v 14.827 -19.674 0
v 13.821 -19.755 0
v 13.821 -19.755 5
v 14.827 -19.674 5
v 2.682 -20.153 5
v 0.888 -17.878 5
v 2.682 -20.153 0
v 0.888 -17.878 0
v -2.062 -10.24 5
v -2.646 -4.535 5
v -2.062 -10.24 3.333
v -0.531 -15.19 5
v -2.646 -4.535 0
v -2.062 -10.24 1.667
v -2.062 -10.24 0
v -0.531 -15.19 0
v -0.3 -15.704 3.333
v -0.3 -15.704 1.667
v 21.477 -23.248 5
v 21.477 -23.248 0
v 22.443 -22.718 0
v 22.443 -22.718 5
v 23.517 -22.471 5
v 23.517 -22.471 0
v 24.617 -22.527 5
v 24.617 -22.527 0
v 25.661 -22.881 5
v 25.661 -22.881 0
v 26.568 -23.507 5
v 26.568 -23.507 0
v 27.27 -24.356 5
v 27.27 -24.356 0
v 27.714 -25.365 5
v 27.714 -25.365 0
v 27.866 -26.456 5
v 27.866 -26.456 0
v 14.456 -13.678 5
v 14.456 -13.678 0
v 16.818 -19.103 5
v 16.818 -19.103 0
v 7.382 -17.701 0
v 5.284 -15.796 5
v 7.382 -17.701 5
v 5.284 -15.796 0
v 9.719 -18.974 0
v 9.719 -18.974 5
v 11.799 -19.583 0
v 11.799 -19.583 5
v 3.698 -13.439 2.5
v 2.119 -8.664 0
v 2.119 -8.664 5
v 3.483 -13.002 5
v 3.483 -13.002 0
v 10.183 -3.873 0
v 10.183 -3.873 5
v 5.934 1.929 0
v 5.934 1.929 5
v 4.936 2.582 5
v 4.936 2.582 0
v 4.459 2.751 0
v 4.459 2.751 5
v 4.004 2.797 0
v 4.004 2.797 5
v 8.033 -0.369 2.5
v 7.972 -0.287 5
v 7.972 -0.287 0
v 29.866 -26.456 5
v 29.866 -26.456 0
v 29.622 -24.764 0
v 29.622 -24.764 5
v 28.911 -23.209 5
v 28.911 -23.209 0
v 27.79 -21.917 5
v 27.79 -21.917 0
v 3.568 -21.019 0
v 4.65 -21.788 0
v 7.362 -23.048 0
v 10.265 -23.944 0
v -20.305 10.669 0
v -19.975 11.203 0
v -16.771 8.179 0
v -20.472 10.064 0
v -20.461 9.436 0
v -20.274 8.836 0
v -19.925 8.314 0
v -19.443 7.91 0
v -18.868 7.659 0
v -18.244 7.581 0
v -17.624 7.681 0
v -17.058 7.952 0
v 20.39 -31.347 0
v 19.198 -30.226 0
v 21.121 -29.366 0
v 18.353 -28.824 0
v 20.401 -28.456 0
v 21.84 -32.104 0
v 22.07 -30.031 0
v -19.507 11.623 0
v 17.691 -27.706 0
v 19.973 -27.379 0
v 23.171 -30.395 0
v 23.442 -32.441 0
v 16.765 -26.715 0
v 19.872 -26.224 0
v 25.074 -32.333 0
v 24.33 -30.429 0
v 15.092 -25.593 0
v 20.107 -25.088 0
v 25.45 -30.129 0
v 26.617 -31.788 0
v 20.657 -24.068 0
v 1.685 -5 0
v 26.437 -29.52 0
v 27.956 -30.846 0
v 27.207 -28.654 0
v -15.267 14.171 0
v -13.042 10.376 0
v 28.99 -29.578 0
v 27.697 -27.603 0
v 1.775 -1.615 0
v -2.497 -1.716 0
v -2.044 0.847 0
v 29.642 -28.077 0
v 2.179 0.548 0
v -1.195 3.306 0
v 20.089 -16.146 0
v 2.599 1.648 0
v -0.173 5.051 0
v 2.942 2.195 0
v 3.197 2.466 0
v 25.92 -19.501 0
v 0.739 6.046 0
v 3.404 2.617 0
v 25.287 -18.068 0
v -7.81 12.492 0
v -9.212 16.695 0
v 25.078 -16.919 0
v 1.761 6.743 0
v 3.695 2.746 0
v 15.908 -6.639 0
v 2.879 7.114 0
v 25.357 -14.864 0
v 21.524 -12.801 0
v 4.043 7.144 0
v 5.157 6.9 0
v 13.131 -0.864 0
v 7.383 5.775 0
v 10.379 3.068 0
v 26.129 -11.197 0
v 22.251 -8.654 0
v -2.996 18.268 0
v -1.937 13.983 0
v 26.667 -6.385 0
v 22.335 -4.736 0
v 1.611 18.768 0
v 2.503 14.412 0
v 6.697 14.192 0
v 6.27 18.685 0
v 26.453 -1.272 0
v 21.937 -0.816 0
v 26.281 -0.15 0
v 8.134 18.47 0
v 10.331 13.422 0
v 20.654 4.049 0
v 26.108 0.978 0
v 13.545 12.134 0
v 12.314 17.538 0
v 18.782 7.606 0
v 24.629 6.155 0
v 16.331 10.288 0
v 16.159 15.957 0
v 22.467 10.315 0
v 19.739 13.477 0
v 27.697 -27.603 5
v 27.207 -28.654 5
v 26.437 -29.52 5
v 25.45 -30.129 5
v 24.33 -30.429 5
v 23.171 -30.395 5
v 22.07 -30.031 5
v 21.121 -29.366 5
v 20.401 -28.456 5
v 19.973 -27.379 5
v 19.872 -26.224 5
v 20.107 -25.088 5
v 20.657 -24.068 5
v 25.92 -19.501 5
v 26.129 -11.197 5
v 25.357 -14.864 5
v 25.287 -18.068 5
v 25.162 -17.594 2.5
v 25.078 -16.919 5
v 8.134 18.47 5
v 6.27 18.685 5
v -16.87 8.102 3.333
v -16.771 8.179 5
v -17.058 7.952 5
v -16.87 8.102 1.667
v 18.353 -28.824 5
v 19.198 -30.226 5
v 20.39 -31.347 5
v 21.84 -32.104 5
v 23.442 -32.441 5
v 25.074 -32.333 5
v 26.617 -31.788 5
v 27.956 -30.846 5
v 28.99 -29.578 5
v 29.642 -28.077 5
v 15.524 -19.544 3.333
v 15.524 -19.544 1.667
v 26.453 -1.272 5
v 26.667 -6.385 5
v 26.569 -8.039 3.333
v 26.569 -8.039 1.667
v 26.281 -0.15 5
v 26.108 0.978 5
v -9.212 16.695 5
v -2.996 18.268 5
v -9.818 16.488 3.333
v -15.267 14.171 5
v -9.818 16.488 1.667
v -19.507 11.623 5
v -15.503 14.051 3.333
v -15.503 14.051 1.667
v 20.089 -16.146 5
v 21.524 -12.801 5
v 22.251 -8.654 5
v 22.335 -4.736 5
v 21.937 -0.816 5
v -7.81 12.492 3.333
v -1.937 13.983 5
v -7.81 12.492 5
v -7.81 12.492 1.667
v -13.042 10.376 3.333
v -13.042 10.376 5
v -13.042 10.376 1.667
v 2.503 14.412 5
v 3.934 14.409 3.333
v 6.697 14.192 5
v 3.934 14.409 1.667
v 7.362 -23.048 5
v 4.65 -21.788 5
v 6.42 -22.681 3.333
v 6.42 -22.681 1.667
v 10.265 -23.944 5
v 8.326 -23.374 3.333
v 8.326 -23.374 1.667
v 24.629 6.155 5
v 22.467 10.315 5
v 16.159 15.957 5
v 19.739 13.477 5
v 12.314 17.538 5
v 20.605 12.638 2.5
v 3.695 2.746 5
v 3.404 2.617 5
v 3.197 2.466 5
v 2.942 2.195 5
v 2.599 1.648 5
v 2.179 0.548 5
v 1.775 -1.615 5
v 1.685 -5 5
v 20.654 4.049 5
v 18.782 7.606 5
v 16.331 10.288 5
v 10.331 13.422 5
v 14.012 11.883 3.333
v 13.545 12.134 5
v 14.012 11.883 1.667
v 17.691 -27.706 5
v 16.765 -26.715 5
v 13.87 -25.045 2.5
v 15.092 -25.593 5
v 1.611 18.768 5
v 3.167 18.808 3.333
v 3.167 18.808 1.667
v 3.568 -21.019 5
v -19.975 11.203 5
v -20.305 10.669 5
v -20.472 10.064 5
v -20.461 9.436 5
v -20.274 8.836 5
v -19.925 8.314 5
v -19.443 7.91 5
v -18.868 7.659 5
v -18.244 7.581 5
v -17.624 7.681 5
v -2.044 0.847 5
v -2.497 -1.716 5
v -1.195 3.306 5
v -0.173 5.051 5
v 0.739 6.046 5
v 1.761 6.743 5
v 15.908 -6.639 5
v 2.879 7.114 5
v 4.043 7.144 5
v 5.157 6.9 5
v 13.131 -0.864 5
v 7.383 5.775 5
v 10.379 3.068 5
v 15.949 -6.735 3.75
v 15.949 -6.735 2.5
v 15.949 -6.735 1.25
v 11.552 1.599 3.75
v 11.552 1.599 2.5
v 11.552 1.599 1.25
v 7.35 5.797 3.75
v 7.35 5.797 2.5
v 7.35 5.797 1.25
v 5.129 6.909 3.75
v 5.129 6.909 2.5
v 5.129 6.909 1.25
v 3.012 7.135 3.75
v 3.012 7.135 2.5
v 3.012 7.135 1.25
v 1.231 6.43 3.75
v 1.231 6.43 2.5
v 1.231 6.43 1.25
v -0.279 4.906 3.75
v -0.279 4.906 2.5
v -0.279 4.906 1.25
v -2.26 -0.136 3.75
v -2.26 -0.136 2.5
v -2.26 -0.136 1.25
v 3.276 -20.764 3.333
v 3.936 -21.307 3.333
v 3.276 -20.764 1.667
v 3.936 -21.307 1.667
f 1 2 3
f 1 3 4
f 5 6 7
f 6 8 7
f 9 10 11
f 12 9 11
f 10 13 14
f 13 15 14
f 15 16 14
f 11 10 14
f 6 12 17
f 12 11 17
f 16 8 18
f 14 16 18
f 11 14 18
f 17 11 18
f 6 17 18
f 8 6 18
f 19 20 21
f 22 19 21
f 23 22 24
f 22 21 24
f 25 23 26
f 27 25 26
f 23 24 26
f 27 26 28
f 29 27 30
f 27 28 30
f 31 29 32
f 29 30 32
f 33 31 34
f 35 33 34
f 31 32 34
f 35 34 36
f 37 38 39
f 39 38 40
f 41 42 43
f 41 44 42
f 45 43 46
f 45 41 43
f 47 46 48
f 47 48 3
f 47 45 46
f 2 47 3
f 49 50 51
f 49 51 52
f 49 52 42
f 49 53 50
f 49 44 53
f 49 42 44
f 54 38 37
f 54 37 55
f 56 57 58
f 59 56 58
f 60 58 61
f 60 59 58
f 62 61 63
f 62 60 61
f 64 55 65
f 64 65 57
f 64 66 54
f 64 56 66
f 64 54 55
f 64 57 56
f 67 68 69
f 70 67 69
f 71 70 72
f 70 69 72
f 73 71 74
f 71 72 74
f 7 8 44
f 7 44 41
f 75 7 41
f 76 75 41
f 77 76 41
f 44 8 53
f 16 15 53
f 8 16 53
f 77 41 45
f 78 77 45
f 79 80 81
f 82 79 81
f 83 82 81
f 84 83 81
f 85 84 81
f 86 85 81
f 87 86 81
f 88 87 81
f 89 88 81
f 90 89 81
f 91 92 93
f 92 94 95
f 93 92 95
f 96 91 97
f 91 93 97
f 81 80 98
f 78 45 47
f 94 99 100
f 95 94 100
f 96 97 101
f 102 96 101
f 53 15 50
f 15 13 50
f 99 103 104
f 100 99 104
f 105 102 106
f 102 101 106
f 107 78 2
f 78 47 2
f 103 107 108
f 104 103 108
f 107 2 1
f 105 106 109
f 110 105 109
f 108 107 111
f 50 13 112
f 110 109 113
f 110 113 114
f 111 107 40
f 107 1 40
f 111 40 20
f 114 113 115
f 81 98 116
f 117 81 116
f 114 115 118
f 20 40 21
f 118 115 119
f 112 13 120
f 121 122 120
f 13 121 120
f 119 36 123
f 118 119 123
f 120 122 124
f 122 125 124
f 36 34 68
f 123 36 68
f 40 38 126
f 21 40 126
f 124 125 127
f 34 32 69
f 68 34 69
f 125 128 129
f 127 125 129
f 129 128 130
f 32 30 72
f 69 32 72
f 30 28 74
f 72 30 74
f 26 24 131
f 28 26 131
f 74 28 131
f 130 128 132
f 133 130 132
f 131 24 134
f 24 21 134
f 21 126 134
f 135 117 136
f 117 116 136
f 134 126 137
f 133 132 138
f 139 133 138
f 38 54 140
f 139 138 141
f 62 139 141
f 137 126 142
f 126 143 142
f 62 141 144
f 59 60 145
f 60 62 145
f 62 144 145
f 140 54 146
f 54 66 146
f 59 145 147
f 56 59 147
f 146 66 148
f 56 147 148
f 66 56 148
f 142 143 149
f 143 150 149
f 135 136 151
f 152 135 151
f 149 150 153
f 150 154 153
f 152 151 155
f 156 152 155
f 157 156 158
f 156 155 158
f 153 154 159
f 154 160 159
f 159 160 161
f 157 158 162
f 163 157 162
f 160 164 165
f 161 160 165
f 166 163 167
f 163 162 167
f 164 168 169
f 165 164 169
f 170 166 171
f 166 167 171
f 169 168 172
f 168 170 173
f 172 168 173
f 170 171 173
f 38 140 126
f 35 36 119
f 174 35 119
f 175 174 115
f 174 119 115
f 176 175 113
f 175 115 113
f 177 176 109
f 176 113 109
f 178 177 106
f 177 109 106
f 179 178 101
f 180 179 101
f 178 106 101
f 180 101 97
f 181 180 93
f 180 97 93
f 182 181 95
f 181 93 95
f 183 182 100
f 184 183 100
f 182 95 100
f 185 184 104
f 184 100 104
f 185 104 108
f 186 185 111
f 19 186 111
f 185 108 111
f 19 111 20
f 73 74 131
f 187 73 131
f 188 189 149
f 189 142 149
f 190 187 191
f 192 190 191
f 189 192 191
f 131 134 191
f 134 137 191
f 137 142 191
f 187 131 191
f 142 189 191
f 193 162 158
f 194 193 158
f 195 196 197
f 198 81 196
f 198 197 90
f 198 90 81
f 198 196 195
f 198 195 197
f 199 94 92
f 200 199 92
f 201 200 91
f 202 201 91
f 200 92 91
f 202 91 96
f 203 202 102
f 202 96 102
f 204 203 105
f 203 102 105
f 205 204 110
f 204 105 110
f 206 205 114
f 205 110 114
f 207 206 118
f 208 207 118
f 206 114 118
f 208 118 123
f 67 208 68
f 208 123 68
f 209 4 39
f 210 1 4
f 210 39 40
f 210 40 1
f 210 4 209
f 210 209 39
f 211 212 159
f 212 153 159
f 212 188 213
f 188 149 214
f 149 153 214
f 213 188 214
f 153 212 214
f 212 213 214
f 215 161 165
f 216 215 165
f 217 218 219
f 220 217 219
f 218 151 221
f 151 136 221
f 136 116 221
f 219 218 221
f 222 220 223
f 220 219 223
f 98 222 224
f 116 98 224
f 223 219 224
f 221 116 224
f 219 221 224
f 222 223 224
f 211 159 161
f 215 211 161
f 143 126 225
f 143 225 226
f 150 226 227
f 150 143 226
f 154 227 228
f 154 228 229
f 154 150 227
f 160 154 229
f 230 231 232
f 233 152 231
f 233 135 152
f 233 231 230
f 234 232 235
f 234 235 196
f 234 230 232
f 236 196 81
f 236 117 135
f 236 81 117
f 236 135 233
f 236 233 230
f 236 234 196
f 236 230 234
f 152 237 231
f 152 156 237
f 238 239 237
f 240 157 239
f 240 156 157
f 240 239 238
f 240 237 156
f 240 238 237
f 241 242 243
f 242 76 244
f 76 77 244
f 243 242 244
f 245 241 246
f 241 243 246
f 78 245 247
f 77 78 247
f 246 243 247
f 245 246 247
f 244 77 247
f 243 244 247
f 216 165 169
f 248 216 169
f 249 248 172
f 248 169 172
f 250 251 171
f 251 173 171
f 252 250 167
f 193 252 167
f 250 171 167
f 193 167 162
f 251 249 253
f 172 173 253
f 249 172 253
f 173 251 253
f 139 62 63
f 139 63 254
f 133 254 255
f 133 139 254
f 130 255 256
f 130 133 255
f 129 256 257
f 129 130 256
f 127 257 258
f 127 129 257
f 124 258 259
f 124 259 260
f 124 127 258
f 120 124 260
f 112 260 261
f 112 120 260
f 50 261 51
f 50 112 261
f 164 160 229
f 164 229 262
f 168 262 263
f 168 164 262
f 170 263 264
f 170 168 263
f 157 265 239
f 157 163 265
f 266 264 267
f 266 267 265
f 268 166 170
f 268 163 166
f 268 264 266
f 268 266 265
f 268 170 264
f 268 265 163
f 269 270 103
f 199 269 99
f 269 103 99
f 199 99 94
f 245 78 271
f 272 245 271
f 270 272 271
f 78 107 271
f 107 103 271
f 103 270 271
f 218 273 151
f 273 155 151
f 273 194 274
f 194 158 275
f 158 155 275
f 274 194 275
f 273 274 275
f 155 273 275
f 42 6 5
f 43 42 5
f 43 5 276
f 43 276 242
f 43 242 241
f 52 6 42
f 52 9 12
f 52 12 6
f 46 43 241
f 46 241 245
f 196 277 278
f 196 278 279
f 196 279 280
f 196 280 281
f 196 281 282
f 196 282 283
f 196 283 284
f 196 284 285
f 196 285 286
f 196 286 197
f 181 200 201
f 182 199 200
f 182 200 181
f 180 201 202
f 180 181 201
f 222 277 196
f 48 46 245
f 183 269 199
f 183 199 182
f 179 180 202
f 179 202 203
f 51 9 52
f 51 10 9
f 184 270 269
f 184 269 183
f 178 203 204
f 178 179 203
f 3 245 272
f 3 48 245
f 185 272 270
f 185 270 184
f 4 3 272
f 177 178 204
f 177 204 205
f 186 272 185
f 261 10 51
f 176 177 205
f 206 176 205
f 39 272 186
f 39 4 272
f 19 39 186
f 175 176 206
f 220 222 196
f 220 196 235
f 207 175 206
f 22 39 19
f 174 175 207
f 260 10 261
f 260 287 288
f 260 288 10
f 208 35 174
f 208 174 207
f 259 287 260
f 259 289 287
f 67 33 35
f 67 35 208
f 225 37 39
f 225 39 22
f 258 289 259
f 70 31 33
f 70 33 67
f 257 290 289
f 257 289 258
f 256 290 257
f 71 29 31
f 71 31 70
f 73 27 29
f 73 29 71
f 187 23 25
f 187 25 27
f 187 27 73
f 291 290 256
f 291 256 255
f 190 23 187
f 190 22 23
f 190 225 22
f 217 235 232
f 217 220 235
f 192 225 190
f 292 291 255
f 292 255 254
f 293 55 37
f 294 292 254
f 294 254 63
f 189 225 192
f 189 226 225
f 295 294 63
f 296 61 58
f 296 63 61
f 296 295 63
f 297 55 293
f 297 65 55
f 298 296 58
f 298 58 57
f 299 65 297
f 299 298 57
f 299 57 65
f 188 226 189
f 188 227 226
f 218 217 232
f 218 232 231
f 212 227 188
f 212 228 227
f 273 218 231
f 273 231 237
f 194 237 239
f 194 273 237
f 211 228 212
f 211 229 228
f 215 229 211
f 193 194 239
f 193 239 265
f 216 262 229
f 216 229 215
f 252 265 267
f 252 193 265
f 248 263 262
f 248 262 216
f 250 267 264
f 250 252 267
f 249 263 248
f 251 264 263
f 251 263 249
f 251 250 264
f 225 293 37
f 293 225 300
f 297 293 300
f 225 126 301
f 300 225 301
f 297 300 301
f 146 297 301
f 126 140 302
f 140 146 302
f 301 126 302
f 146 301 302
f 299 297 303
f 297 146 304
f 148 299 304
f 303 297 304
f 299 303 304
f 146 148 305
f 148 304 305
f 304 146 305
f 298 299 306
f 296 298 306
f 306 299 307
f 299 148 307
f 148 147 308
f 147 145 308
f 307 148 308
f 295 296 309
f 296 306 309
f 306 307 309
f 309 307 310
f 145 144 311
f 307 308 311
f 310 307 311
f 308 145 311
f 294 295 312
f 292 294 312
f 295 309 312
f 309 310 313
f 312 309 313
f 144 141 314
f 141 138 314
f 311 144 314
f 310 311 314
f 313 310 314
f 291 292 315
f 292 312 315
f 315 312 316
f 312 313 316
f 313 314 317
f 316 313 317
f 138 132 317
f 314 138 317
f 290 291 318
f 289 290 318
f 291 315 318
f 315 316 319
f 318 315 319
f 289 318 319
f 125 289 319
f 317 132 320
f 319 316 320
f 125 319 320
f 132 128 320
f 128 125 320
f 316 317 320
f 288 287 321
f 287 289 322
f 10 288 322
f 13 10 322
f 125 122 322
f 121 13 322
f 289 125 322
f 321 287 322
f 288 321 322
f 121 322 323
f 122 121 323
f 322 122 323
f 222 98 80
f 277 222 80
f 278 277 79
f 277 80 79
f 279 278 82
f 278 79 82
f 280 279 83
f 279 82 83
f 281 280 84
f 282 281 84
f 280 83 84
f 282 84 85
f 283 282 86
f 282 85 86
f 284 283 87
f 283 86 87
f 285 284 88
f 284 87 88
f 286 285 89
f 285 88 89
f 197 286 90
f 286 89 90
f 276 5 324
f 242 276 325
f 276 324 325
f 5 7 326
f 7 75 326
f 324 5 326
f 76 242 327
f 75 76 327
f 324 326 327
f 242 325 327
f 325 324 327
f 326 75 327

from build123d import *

# Parameters (mm, degrees)
F2_DEPTH = 5
F3_DEPTH = 5


with BuildPart() as f2:
    # F1 (on Top) → F2 (new body)
    with BuildSketch(Plane.XY):
        with BuildLine():
            ThreePointArc((-19.507312665, 11.6229322124), (-20.1181202822, 8.5623774422), (-17.057565512, 7.951569825))
            Line((-17.057565512, 7.951569825), (-19.507312665, 11.6229322124))
        make_face()
        with BuildLine():
            Line((-19.507312665, 11.6229322124), (-17.057565512, 7.951569825))
            add(Edge.make_bspline(
                [(-16.7713887547, 8.1789078924), (-16.8717865921, 8.1021245168), (-16.9672459743, 8.0263028908), (-17.057565512, 7.951569825)],
                knots=[0.9955108382, 0.9955108382, 0.9955108382, 0.9955108382, 1, 1, 1, 1], degree=3))
            ThreePointArc((-16.7713887547, 8.1789078924), (-16.2570191197, 8.9110577334), (-16.0756222127, 9.7872510187))
            ThreePointArc((-16.0756222127, 9.7872510187), (-17.2415334626, 11.7331585708), (-19.507312665, 11.6229322124))
        make_face()
        with BuildLine():
            ThreePointArc((-16.0756222127, 9.7872510187), (-16.2570191197, 8.9110577334), (-16.7713887547, 8.1789078924))
            add(Edge.make_bspline(
                [(-1.9366301412, 13.9833419936), (-7.8442704828, 12.9847341577), (-14.0809859392, 10.2365041031), (-16.7713887547, 8.1789078924)],
                knots=[0.8752128932, 0.8752128932, 0.8752128932, 0.8752128932, 0.9955108382, 0.9955108382, 0.9955108382, 0.9955108382], degree=3))
            Line((-1.9366301412, 13.9833419936), (-2.9955055058, 18.2684533063))
            add(Edge.make_bspline(
                [(-2.9955055058, 18.2684533063), (-10.205223484, 17.0395644672), (-16.5236455239, 13.8231745676), (-19.507312665, 11.6229322124)],
                knots=[0.8859479469, 0.8859479469, 0.8859479469, 0.8859479469, 1, 1, 1, 1], degree=3))
            ThreePointArc((-19.507312665, 11.6229322124), (-17.2415334626, 11.7331585708), (-16.0756222127, 9.7872510187))
        make_face()
        with BuildLine():
            add(Edge.make_bspline(
                [(6.6971361734, 14.1924783526), (4.0081562114, 14.5469298943), (1.0786263214, 14.4930308976), (-1.9366301412, 13.9833419936)],
                knots=[0.8138128865, 0.8138128865, 0.8138128865, 0.8138128865, 0.8752128932, 0.8752128932, 0.8752128932, 0.8752128932], degree=3))
            Line((6.6971361734, 14.1924783526), (7.2017024035, 18.5775449336))
            Line((7.2017024035, 18.5775449336), (6.2696815087, 18.6847876084))
            add(Edge.make_bspline(
                [(6.2696815087, 18.6847876084), (3.1876107705, 18.9485434567), (0.0181857316, 18.7821338049), (-2.9955055058, 18.2684533063)],
                knots=[0.8382737281, 0.8382737281, 0.8382737281, 0.8382737281, 0.8859479469, 0.8859479469, 0.8859479469, 0.8859479469], degree=3))
            Line((-2.9955055058, 18.2684533063), (-1.9366301412, 13.9833419936))
        make_face()
        with BuildLine():
            add(Edge.make_bspline(
                [(21.9372554064, -0.8162904639), (21.7431869177, 0.3623106479), (20.4301582956, 6.1324084279), (16.152381645, 11.7129111681), (9.4405945266, 13.8308456678), (6.6971361734, 14.1924783526)],
                knots=[0.6191029101, 0.6191029101, 0.6191029101, 0.6191029101, 0.6451637189, 0.7511689236, 0.8138128865, 0.8138128865, 0.8138128865, 0.8138128865], degree=3))
            Line((21.9372554064, -0.8162904639), (26.2806469532, -0.1503160042))
            Line((26.2806469532, -0.1503160042), (26.1076679956, 0.977828373))
            add(Edge.make_bspline(
                [(26.1076679956, 0.977828373), (25.2670772101, 5.4120393088), (21.5322437131, 14.2640849333), (12.962415849, 17.7677518812), (8.1337232983, 18.4703022588)],
                knots=[0.6836768106, 0.6836768106, 0.6836768106, 0.6836768106, 0.7527863503, 0.8285964185, 0.8285964185, 0.8285964185, 0.8285964185], degree=3))
            Line((8.1337232983, 18.4703022588), (7.2017024035, 18.5775449336))
            Line((7.2017024035, 18.5775449336), (6.6971361734, 14.1924783526))
        make_face()
        with BuildLine():
            add(Edge.make_bspline(
                [(20.0889106767, -16.1463050153), (20.4855715931, -15.5166440607), (22.4234534354, -11.5479066644), (22.6814531517, -5.335892259), (21.9372554064, -0.8162904639)],
                knots=[0.4975551523, 0.4975551523, 0.4975551523, 0.4975551523, 0.519167082, 0.6191029101, 0.6191029101, 0.6191029101, 0.6191029101], degree=3))
            Line((20.0889106767, -16.1463050153), (21.8660161198, -20.2279227937))
            add(Edge.make_bspline(
                [(21.8660161198, -20.2279227937), (23.9564655762, -18.010472491), (25.3947838602, -14.9261205718), (26.1291940116, -11.1969289511)],
                knots=[0.5539035838, 0.5539035838, 0.5539035838, 0.5539035838, 0.619066066, 0.619066066, 0.619066066, 0.619066066], degree=3))
            add(Edge.make_bspline(
                [(26.1291940116, -11.1969289511), (26.7264057456, -8.1644041557), (26.8581436115, -4.7054657187), (26.4527034305, -1.2724440954)],
                knots=[0.619066066, 0.619066066, 0.619066066, 0.619066066, 0.672055256, 0.672055256, 0.672055256, 0.672055256], degree=3))
            Line((26.4527034305, -1.2724440954), (26.2806469532, -0.1503160042))
            Line((26.2806469532, -0.1503160042), (21.9372554064, -0.8162904639))
        make_face()
        with BuildLine():
            add(Edge.make_bspline(
                [(20.28384615, -21.6454952109), (20.3180391843, -21.619825131), (20.3521016985, -21.5939675956), (20.3860335419, -21.5679232514)],
                knots=[0.5385810267, 0.5385810267, 0.5385810267, 0.5385810267, 0.5395116224, 0.5395116224, 0.5395116224, 0.5395116224], degree=3))
            ThreePointArc((20.3860335419, -21.5679232514), (20.3339721116, -21.6054033459), (20.2823143723, -21.6434379089))
            Line((20.2823143723, -21.6434379089), (20.28384615, -21.6454952109))
        make_face()
        with BuildLine():
            add(Edge.make_bspline(
                [(20.1552763015, -21.7406841825), (20.1983358242, -21.7092470611), (20.2411925379, -21.6775169854), (20.28384615, -21.6454952109)],
                knots=[0.5374201682, 0.5374201682, 0.5374201682, 0.5374201682, 0.5385810267, 0.5385810267, 0.5385810267, 0.5385810267], degree=3))
            ThreePointArc((20.1552763015, -21.7406841825), (18.050857211, -24.9762457931), (18.3526513671, -28.8241489794))
            ThreePointArc((18.3526513671, -28.8241489794), (25.0743998115, -32.3329402852), (29.8655263595, -26.4559831663))
            ThreePointArc((29.8655263595, -26.4559831663), (29.3220011482, -23.9606108735), (27.7898987328, -21.9173378315))
            ThreePointArc((27.7898987328, -21.9173378315), (24.1483727701, -20.4626537154), (20.3860335419, -21.5679232514))
            add(Edge.make_bspline(
                [(20.28384615, -21.6454952109), (20.3180391843, -21.619825131), (20.3521016985, -21.5939675956), (20.3860335419, -21.5679232514)],
                knots=[0.5385810267, 0.5385810267, 0.5385810267, 0.5385810267, 0.5395116224, 0.5395116224, 0.5395116224, 0.5395116224], degree=3))
        make_face()
        with BuildLine():
            ThreePointArc((27.8655263595, -26.4559831663), (22.0704263575, -30.0305623), (21.4767183681, -23.2476196614))
            ThreePointArc((21.4767183681, -23.2476196614), (25.6606263615, -22.8814040327), (27.8655263595, -26.4559831663))
        make_face(mode=Mode.SUBTRACT)
        with BuildLine():
            ThreePointArc((20.2823143723, -21.6434379089), (20.2184711967, -21.6916376038), (20.1552763015, -21.7406841825))
            add(Edge.make_bspline(
                [(20.1552763015, -21.7406841825), (20.1983358242, -21.7092470611), (20.2411925379, -21.6775169854), (20.28384615, -21.6454952109)],
                knots=[0.5374201682, 0.5374201682, 0.5374201682, 0.5374201682, 0.5385810267, 0.5385810267, 0.5385810267, 0.5385810267], degree=3))
            Line((20.28384615, -21.6454952109), (20.2823143723, -21.6434379089))
        make_face()
        with BuildLine():
            add(Edge.make_bspline(
                [(21.8660161198, -20.2279227937), (23.9564655762, -18.010472491), (25.3947838602, -14.9261205718), (26.1291940116, -11.1969289511)],
                knots=[0.5539035838, 0.5539035838, 0.5539035838, 0.5539035838, 0.619066066, 0.619066066, 0.619066066, 0.619066066], degree=3))
            add(Edge.make_bspline(
                [(20.3860335419, -21.5679232514), (20.910800353, -21.1651391388), (21.404313823, -20.7176748394), (21.8660161198, -20.2279227937)],
                knots=[0.5395116224, 0.5395116224, 0.5395116224, 0.5395116224, 0.5539035838, 0.5539035838, 0.5539035838, 0.5539035838], degree=3))
            ThreePointArc((20.3860335419, -21.5679232514), (24.1483727701, -20.4626537154), (27.7898987328, -21.9173378315))
            add(Edge.make_bspline(
                [(27.7898987328, -21.9173378315), (26.3633456032, -20.5185059493), (24.378390887, -17.0223641834), (25.3979956076, -15.1471171757), (26.1291940116, -11.1969289511)],
                knots=[0, 0, 0, 0, 0.4693003582, 1, 1, 1, 1], degree=3))
        make_face()
        with BuildLine():
            add(Edge.make_bspline(
                [(16.8182095123, -19.1030671497), (18.1425078952, -18.5024765803), (19.2361062905, -17.500049742), (20.0889106767, -16.1463050153)],
                knots=[0.451090407, 0.451090407, 0.451090407, 0.451090407, 0.4975551523, 0.4975551523, 0.4975551523, 0.4975551523], degree=3))
            Line((16.8182095123, -19.1030671497), (18.423830983, -22.7908242075))
            add(Edge.make_bspline(
                [(18.423830983, -22.7908242075), (19.0330581339, -22.4893818232), (19.6104042868, -22.1384871917), (20.1552763015, -21.7406841825)],
                knots=[0.5227307518, 0.5227307518, 0.5227307518, 0.5227307518, 0.5374201682, 0.5374201682, 0.5374201682, 0.5374201682], degree=3))
            ThreePointArc((20.1552763015, -21.7406841825), (20.2184711967, -21.6916376038), (20.2823143723, -21.6434379089))
            ThreePointArc((20.2823143723, -21.6434379089), (20.3339721116, -21.6054033459), (20.3860335419, -21.5679232514))
            add(Edge.make_bspline(
                [(20.3860335419, -21.5679232514), (20.910800353, -21.1651391388), (21.404313823, -20.7176748394), (21.8660161198, -20.2279227937)],
                knots=[0.5395116224, 0.5395116224, 0.5395116224, 0.5395116224, 0.5539035838, 0.5539035838, 0.5539035838, 0.5539035838], degree=3))
            Line((21.8660161198, -20.2279227937), (20.0889106767, -16.1463050153))
        make_face()
        with BuildLine():
            add(Edge.make_bspline(
                [(14.4563719041, -13.6784490389), (11.9478924144, -7.7422020563), (9.7349430762, -1.5657958226), (5.2149294509, 2.8546170768), (4.0040064051, 2.7972669281)],
                knots=[0.0049121983, 0.0049121983, 0.0049121983, 0.0049121983, 0.1221501352, 0.1829454827, 0.1829454827, 0.1829454827, 0.1829454827], degree=3))
            Line((14.4563719041, -13.6784490389), (16.8182095123, -19.1030671497))
            add(Edge.make_bspline(
                [(16.8182095123, -19.1030671497), (18.1425078952, -18.5024765803), (19.2361062905, -17.500049742), (20.0889106767, -16.1463050153)],
                knots=[0.451090407, 0.451090407, 0.451090407, 0.451090407, 0.4975551523, 0.4975551523, 0.4975551523, 0.4975551523], degree=3))
            add(Edge.make_bspline(
                [(20.0889106767, -16.1463050153), (16.9401236551, -9.9142919394), (13.6823761538, 1.6324368893), (2.5693543705, 9.8063367262), (-2.1248910522, 3.022137917), (-2.6490037256, -2.9809927289), (-2.6464978897, -4.5347120871)],
                knots=[0, 0, 0, 0, 0.1199634116, 0.2062068397, 0.2872216608, 0.314003854, 0.314003854, 0.314003854, 0.314003854], degree=3))
            Line((-2.6464978897, -4.5347120871), (2.1194828857, -8.6641340779))
            add(Edge.make_bspline(
                [(4.0040064051, 2.7972669281), (3.7641689139, 2.7859080594), (1.8125458048, 2.1592306174), (1.1732206956, -3.8027881615), (2.1194828857, -8.6641340779)],
                knots=[0.1829454827, 0.1829454827, 0.1829454827, 0.1829454827, 0.1949867133, 0.2865650036, 0.2865650036, 0.2865650036, 0.2865650036], degree=3))
        make_face()
        with BuildLine():
            add(Edge.make_bspline(
                [(2.1194828857, -8.6641340779), (2.451951584, -10.3721652827), (4.5992106957, -17.2300714321), (10.3005032332, -19.8299319856), (13.8213645144, -19.7546669605)],
                knots=[0.2865650036, 0.2865650036, 0.2865650036, 0.2865650036, 0.3187409854, 0.4196783767, 0.4196783767, 0.4196783767, 0.4196783767], degree=3))
            Line((2.1194828857, -8.6641340779), (-2.6464978897, -4.5347120871))
            add(Edge.make_bspline(
                [(-2.6464978897, -4.5347120871), (-2.6375186339, -10.1022130055), (-0.9243512122, -16.4688966728), (2.6815896388, -20.1529055202)],
                knots=[0.314003854, 0.314003854, 0.314003854, 0.314003854, 0.4099734929, 0.4099734929, 0.4099734929, 0.4099734929], degree=3))
            add(Edge.make_bspline(
                [(2.6815896388, -20.1529055202), (3.2888595942, -20.7733227653), (3.9498110967, -21.3176558196), (4.6502852132, -21.7881497513)],
                knots=[0.4099734929, 0.4099734929, 0.4099734929, 0.4099734929, 0.4261355656, 0.4261355656, 0.4261355656, 0.4261355656], degree=3))
            add(Edge.make_bspline(
                [(4.6502852132, -21.7881497513), (6.3183184941, -22.808218778), (8.3425108076, -23.4085076745), (10.2652286752, -23.9440009422)],
                knots=[0.1237445993, 0.1237445993, 0.1237445993, 0.1237445993, 0.402852742, 0.402852742, 0.402852742, 0.402852742], degree=3))
            add(Edge.make_bspline(
                [(10.2652286752, -23.9440009422), (12.7368741912, -24.3235901556), (15.6569018468, -24.0237679584), (18.0975894514, -22.9522467983), (18.423830983, -22.7908242075)],
                knots=[0.4654861274, 0.4654861274, 0.4654861274, 0.4654861274, 0.5148645599, 0.5227307518, 0.5227307518, 0.5227307518, 0.5227307518], degree=3))
            Line((18.423830983, -22.7908242075), (14.8270740529, -19.6744609944))
            add(Edge.make_bspline(
                [(13.8213645144, -19.7546669605), (14.1476800852, -19.747691352), (14.4841877515, -19.7218219565), (14.8105324117, -19.6767961713), (14.8270740529, -19.6744609944)],
                knots=[0.4196783767, 0.4196783767, 0.4196783767, 0.4196783767, 0.4290333156, 0.4295336475, 0.4295336475, 0.4295336475, 0.4295336475], degree=3))
        make_face()
        with BuildLine():
            add(Edge.make_bspline(
                [(2.6815896388, -20.1529055202), (3.2888595942, -20.7733227653), (3.9498110967, -21.3176558196), (4.6502852132, -21.7881497513)],
                knots=[0.4099734929, 0.4099734929, 0.4099734929, 0.4099734929, 0.4261355656, 0.4261355656, 0.4261355656, 0.4261355656], degree=3))
            add(Edge.make_bspline(
                [(2.6815896388, -20.1529055202), (3.2412247581, -20.8011255668), (3.9107506805, -21.3358948235), (4.6502852132, -21.7881497513)],
                knots=[0, 0, 0, 0, 0.1237445993, 0.1237445993, 0.1237445993, 0.1237445993], degree=3))
        make_face()
        with BuildLine():
            add(Edge.make_bspline(
                [(18.423830983, -22.7908242075), (19.0330581339, -22.4893818232), (19.6104042868, -22.1384871917), (20.1552763015, -21.7406841825)],
                knots=[0.5227307518, 0.5227307518, 0.5227307518, 0.5227307518, 0.5374201682, 0.5374201682, 0.5374201682, 0.5374201682], degree=3))
            add(Edge.make_bspline(
                [(10.2652286752, -23.9440009422), (12.7368741912, -24.3235901556), (15.6569018468, -24.0237679584), (18.0975894514, -22.9522467983), (18.423830983, -22.7908242075)],
                knots=[0.4654861274, 0.4654861274, 0.4654861274, 0.4654861274, 0.5148645599, 0.5227307518, 0.5227307518, 0.5227307518, 0.5227307518], degree=3))
            add(Edge.make_bspline(
                [(10.2652286752, -23.9440009422), (11.5592578214, -24.3043990577), (15.5267661481, -25.3567777314), (17.6199648235, -27.2061546689), (18.3526513671, -28.8241489794)],
                knots=[0.402852742, 0.402852742, 0.402852742, 0.402852742, 0.5906983316, 1, 1, 1, 1], degree=3))
            ThreePointArc((18.3526513671, -28.8241489794), (18.050857211, -24.9762457931), (20.1552763015, -21.7406841825))
        make_face()
        with BuildLine():
            Line((18.423830983, -22.7908242075), (16.8182095123, -19.1030671497))
            add(Edge.make_bspline(
                [(14.8270740529, -19.6744609944), (15.5397694035, -19.5738500762), (16.2038172105, -19.3817039186), (16.8182095123, -19.1030671497)],
                knots=[0.4295336475, 0.4295336475, 0.4295336475, 0.4295336475, 0.451090407, 0.451090407, 0.451090407, 0.451090407], degree=3))
            Line((14.8270740529, -19.6744609944), (18.423830983, -22.7908242075))
        make_face()
    extrude(amount=F2_DEPTH)

    # F1 (on Top) → F3 (join)
    with BuildSketch(Plane.XY):
        with BuildLine():
            add(Edge.make_bspline(
                [(18.423830983, -22.7908242075), (19.0330581339, -22.4893818232), (19.6104042868, -22.1384871917), (20.1552763015, -21.7406841825)],
                knots=[0.5227307518, 0.5227307518, 0.5227307518, 0.5227307518, 0.5374201682, 0.5374201682, 0.5374201682, 0.5374201682], degree=3))
            add(Edge.make_bspline(
                [(10.2652286752, -23.9440009422), (12.7368741912, -24.3235901556), (15.6569018468, -24.0237679584), (18.0975894514, -22.9522467983), (18.423830983, -22.7908242075)],
                knots=[0.4654861274, 0.4654861274, 0.4654861274, 0.4654861274, 0.5148645599, 0.5227307518, 0.5227307518, 0.5227307518, 0.5227307518], degree=3))
            add(Edge.make_bspline(
                [(10.2652286752, -23.9440009422), (11.5592578214, -24.3043990577), (15.5267661481, -25.3567777314), (17.6199648235, -27.2061546689), (18.3526513671, -28.8241489794)],
                knots=[0.402852742, 0.402852742, 0.402852742, 0.402852742, 0.5906983316, 1, 1, 1, 1], degree=3))
            ThreePointArc((18.3526513671, -28.8241489794), (18.050857211, -24.9762457931), (20.1552763015, -21.7406841825))
        make_face()
    extrude(amount=F3_DEPTH)


solid = f2.part
